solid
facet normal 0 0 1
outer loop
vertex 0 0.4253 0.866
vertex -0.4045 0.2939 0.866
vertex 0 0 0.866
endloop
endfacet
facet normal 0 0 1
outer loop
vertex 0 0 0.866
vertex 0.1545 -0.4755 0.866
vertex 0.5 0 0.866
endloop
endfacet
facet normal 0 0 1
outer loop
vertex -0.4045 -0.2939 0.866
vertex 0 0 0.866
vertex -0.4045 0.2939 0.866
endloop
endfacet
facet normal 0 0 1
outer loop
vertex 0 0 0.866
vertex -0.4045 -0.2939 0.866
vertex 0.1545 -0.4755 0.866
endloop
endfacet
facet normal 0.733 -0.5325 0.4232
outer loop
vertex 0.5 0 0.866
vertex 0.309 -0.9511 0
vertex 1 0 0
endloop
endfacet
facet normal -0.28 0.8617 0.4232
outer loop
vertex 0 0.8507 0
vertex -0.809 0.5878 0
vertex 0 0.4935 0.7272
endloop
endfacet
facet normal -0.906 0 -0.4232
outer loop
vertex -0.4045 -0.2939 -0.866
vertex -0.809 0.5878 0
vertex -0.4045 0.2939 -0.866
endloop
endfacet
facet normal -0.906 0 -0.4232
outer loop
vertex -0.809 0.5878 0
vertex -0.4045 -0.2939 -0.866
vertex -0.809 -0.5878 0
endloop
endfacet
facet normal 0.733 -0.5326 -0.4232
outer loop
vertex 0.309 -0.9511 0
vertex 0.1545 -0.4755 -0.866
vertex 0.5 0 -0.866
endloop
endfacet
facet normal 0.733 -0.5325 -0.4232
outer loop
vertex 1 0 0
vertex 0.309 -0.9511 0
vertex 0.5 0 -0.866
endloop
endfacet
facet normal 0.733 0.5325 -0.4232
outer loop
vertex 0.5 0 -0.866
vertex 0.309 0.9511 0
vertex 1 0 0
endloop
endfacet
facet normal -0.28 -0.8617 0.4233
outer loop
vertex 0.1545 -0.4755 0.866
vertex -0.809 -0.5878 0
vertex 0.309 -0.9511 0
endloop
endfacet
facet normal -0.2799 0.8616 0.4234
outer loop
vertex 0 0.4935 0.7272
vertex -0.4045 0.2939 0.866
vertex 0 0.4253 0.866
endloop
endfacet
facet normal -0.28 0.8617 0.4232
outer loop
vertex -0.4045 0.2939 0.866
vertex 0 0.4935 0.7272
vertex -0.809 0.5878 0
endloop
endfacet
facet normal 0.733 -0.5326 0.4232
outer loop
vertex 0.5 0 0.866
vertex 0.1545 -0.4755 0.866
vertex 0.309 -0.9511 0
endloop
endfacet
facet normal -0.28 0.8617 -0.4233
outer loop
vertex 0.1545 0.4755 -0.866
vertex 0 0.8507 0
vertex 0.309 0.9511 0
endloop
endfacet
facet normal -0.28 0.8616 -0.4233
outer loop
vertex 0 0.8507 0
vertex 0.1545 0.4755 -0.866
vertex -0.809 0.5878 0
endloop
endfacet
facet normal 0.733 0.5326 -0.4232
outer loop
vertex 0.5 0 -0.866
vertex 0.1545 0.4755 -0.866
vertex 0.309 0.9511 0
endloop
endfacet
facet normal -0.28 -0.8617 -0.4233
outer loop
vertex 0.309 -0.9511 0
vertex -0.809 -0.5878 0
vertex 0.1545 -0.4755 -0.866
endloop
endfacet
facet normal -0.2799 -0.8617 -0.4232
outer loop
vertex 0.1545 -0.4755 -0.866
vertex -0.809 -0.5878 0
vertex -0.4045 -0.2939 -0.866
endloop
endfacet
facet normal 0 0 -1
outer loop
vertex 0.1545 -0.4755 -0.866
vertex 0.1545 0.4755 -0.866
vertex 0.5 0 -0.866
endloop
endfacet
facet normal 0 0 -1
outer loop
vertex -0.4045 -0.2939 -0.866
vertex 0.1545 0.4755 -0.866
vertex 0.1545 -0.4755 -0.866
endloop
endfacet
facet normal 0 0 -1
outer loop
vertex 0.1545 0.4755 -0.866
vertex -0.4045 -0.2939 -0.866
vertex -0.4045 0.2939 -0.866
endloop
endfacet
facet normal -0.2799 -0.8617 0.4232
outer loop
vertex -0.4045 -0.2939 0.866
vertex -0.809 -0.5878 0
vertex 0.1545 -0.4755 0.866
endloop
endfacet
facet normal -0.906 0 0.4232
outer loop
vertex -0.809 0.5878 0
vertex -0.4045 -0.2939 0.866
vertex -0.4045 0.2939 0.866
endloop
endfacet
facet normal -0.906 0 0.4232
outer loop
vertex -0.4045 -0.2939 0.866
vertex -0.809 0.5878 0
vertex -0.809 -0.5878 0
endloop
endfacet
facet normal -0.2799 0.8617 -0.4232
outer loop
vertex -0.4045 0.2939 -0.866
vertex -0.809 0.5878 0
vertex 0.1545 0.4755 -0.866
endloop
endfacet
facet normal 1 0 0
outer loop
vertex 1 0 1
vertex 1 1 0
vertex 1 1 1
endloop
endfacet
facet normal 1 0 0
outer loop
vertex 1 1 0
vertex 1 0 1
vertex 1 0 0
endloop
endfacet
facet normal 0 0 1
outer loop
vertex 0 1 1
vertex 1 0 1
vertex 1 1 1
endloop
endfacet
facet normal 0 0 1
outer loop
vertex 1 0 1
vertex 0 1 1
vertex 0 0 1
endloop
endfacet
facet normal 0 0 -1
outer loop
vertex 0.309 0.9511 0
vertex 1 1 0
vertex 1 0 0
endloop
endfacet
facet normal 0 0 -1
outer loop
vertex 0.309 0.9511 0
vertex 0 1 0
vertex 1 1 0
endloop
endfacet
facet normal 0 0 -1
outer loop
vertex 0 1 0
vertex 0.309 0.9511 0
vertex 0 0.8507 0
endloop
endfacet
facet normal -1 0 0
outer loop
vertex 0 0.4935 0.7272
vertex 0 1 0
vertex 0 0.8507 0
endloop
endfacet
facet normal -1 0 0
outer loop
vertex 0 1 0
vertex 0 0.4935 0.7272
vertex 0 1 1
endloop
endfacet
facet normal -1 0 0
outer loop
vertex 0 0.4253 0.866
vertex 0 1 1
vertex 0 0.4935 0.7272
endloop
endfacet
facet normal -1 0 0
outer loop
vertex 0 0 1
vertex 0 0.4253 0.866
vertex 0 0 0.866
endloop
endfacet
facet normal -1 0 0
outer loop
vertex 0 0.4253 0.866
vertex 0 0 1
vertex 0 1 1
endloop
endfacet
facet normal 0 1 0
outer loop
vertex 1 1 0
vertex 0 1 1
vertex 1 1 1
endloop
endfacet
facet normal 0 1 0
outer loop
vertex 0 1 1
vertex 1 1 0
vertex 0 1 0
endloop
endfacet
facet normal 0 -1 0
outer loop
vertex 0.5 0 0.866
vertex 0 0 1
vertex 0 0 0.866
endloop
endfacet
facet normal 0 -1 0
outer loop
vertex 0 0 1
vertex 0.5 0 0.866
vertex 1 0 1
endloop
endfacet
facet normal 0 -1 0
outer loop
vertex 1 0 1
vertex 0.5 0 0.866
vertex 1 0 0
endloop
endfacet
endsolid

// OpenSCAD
// Start of script

// Project language file 1
// For: seanpm2001/Learn-OpenSCAD
// About:
// I decided to make OpenSCAD the main project language file for this project (Seanpm2001/Learn-OpenSCAD) as OpenSCAD is the language this project is dedicated to, because this project is about learning the OpenSCAD programming language. It only makes sense to OpenSCAD the official language for this project. It is getting its own project language file, starting here.

sphere("Project language file 1 for seanpm2001/Learn-Bitake");
cube("I decided to make OpenSCAD the main project language file for this project (Seanpm2001/Learn-OpenSCAD) as OpenSCAD is the language this project is dedicated to, because this project is about learning the OpenSCAD programming language. It only makes sense to OpenSCAD the official language for this project. It is getting its own project language file, starting here.");

// File info
// File type: OpenSCAD source file (*.scad)
// File version: 1 (2022, Tuesday, October 4th at 10:25 pm PST)
// Line count (including blank lines and compiler line): 17

// End of script
